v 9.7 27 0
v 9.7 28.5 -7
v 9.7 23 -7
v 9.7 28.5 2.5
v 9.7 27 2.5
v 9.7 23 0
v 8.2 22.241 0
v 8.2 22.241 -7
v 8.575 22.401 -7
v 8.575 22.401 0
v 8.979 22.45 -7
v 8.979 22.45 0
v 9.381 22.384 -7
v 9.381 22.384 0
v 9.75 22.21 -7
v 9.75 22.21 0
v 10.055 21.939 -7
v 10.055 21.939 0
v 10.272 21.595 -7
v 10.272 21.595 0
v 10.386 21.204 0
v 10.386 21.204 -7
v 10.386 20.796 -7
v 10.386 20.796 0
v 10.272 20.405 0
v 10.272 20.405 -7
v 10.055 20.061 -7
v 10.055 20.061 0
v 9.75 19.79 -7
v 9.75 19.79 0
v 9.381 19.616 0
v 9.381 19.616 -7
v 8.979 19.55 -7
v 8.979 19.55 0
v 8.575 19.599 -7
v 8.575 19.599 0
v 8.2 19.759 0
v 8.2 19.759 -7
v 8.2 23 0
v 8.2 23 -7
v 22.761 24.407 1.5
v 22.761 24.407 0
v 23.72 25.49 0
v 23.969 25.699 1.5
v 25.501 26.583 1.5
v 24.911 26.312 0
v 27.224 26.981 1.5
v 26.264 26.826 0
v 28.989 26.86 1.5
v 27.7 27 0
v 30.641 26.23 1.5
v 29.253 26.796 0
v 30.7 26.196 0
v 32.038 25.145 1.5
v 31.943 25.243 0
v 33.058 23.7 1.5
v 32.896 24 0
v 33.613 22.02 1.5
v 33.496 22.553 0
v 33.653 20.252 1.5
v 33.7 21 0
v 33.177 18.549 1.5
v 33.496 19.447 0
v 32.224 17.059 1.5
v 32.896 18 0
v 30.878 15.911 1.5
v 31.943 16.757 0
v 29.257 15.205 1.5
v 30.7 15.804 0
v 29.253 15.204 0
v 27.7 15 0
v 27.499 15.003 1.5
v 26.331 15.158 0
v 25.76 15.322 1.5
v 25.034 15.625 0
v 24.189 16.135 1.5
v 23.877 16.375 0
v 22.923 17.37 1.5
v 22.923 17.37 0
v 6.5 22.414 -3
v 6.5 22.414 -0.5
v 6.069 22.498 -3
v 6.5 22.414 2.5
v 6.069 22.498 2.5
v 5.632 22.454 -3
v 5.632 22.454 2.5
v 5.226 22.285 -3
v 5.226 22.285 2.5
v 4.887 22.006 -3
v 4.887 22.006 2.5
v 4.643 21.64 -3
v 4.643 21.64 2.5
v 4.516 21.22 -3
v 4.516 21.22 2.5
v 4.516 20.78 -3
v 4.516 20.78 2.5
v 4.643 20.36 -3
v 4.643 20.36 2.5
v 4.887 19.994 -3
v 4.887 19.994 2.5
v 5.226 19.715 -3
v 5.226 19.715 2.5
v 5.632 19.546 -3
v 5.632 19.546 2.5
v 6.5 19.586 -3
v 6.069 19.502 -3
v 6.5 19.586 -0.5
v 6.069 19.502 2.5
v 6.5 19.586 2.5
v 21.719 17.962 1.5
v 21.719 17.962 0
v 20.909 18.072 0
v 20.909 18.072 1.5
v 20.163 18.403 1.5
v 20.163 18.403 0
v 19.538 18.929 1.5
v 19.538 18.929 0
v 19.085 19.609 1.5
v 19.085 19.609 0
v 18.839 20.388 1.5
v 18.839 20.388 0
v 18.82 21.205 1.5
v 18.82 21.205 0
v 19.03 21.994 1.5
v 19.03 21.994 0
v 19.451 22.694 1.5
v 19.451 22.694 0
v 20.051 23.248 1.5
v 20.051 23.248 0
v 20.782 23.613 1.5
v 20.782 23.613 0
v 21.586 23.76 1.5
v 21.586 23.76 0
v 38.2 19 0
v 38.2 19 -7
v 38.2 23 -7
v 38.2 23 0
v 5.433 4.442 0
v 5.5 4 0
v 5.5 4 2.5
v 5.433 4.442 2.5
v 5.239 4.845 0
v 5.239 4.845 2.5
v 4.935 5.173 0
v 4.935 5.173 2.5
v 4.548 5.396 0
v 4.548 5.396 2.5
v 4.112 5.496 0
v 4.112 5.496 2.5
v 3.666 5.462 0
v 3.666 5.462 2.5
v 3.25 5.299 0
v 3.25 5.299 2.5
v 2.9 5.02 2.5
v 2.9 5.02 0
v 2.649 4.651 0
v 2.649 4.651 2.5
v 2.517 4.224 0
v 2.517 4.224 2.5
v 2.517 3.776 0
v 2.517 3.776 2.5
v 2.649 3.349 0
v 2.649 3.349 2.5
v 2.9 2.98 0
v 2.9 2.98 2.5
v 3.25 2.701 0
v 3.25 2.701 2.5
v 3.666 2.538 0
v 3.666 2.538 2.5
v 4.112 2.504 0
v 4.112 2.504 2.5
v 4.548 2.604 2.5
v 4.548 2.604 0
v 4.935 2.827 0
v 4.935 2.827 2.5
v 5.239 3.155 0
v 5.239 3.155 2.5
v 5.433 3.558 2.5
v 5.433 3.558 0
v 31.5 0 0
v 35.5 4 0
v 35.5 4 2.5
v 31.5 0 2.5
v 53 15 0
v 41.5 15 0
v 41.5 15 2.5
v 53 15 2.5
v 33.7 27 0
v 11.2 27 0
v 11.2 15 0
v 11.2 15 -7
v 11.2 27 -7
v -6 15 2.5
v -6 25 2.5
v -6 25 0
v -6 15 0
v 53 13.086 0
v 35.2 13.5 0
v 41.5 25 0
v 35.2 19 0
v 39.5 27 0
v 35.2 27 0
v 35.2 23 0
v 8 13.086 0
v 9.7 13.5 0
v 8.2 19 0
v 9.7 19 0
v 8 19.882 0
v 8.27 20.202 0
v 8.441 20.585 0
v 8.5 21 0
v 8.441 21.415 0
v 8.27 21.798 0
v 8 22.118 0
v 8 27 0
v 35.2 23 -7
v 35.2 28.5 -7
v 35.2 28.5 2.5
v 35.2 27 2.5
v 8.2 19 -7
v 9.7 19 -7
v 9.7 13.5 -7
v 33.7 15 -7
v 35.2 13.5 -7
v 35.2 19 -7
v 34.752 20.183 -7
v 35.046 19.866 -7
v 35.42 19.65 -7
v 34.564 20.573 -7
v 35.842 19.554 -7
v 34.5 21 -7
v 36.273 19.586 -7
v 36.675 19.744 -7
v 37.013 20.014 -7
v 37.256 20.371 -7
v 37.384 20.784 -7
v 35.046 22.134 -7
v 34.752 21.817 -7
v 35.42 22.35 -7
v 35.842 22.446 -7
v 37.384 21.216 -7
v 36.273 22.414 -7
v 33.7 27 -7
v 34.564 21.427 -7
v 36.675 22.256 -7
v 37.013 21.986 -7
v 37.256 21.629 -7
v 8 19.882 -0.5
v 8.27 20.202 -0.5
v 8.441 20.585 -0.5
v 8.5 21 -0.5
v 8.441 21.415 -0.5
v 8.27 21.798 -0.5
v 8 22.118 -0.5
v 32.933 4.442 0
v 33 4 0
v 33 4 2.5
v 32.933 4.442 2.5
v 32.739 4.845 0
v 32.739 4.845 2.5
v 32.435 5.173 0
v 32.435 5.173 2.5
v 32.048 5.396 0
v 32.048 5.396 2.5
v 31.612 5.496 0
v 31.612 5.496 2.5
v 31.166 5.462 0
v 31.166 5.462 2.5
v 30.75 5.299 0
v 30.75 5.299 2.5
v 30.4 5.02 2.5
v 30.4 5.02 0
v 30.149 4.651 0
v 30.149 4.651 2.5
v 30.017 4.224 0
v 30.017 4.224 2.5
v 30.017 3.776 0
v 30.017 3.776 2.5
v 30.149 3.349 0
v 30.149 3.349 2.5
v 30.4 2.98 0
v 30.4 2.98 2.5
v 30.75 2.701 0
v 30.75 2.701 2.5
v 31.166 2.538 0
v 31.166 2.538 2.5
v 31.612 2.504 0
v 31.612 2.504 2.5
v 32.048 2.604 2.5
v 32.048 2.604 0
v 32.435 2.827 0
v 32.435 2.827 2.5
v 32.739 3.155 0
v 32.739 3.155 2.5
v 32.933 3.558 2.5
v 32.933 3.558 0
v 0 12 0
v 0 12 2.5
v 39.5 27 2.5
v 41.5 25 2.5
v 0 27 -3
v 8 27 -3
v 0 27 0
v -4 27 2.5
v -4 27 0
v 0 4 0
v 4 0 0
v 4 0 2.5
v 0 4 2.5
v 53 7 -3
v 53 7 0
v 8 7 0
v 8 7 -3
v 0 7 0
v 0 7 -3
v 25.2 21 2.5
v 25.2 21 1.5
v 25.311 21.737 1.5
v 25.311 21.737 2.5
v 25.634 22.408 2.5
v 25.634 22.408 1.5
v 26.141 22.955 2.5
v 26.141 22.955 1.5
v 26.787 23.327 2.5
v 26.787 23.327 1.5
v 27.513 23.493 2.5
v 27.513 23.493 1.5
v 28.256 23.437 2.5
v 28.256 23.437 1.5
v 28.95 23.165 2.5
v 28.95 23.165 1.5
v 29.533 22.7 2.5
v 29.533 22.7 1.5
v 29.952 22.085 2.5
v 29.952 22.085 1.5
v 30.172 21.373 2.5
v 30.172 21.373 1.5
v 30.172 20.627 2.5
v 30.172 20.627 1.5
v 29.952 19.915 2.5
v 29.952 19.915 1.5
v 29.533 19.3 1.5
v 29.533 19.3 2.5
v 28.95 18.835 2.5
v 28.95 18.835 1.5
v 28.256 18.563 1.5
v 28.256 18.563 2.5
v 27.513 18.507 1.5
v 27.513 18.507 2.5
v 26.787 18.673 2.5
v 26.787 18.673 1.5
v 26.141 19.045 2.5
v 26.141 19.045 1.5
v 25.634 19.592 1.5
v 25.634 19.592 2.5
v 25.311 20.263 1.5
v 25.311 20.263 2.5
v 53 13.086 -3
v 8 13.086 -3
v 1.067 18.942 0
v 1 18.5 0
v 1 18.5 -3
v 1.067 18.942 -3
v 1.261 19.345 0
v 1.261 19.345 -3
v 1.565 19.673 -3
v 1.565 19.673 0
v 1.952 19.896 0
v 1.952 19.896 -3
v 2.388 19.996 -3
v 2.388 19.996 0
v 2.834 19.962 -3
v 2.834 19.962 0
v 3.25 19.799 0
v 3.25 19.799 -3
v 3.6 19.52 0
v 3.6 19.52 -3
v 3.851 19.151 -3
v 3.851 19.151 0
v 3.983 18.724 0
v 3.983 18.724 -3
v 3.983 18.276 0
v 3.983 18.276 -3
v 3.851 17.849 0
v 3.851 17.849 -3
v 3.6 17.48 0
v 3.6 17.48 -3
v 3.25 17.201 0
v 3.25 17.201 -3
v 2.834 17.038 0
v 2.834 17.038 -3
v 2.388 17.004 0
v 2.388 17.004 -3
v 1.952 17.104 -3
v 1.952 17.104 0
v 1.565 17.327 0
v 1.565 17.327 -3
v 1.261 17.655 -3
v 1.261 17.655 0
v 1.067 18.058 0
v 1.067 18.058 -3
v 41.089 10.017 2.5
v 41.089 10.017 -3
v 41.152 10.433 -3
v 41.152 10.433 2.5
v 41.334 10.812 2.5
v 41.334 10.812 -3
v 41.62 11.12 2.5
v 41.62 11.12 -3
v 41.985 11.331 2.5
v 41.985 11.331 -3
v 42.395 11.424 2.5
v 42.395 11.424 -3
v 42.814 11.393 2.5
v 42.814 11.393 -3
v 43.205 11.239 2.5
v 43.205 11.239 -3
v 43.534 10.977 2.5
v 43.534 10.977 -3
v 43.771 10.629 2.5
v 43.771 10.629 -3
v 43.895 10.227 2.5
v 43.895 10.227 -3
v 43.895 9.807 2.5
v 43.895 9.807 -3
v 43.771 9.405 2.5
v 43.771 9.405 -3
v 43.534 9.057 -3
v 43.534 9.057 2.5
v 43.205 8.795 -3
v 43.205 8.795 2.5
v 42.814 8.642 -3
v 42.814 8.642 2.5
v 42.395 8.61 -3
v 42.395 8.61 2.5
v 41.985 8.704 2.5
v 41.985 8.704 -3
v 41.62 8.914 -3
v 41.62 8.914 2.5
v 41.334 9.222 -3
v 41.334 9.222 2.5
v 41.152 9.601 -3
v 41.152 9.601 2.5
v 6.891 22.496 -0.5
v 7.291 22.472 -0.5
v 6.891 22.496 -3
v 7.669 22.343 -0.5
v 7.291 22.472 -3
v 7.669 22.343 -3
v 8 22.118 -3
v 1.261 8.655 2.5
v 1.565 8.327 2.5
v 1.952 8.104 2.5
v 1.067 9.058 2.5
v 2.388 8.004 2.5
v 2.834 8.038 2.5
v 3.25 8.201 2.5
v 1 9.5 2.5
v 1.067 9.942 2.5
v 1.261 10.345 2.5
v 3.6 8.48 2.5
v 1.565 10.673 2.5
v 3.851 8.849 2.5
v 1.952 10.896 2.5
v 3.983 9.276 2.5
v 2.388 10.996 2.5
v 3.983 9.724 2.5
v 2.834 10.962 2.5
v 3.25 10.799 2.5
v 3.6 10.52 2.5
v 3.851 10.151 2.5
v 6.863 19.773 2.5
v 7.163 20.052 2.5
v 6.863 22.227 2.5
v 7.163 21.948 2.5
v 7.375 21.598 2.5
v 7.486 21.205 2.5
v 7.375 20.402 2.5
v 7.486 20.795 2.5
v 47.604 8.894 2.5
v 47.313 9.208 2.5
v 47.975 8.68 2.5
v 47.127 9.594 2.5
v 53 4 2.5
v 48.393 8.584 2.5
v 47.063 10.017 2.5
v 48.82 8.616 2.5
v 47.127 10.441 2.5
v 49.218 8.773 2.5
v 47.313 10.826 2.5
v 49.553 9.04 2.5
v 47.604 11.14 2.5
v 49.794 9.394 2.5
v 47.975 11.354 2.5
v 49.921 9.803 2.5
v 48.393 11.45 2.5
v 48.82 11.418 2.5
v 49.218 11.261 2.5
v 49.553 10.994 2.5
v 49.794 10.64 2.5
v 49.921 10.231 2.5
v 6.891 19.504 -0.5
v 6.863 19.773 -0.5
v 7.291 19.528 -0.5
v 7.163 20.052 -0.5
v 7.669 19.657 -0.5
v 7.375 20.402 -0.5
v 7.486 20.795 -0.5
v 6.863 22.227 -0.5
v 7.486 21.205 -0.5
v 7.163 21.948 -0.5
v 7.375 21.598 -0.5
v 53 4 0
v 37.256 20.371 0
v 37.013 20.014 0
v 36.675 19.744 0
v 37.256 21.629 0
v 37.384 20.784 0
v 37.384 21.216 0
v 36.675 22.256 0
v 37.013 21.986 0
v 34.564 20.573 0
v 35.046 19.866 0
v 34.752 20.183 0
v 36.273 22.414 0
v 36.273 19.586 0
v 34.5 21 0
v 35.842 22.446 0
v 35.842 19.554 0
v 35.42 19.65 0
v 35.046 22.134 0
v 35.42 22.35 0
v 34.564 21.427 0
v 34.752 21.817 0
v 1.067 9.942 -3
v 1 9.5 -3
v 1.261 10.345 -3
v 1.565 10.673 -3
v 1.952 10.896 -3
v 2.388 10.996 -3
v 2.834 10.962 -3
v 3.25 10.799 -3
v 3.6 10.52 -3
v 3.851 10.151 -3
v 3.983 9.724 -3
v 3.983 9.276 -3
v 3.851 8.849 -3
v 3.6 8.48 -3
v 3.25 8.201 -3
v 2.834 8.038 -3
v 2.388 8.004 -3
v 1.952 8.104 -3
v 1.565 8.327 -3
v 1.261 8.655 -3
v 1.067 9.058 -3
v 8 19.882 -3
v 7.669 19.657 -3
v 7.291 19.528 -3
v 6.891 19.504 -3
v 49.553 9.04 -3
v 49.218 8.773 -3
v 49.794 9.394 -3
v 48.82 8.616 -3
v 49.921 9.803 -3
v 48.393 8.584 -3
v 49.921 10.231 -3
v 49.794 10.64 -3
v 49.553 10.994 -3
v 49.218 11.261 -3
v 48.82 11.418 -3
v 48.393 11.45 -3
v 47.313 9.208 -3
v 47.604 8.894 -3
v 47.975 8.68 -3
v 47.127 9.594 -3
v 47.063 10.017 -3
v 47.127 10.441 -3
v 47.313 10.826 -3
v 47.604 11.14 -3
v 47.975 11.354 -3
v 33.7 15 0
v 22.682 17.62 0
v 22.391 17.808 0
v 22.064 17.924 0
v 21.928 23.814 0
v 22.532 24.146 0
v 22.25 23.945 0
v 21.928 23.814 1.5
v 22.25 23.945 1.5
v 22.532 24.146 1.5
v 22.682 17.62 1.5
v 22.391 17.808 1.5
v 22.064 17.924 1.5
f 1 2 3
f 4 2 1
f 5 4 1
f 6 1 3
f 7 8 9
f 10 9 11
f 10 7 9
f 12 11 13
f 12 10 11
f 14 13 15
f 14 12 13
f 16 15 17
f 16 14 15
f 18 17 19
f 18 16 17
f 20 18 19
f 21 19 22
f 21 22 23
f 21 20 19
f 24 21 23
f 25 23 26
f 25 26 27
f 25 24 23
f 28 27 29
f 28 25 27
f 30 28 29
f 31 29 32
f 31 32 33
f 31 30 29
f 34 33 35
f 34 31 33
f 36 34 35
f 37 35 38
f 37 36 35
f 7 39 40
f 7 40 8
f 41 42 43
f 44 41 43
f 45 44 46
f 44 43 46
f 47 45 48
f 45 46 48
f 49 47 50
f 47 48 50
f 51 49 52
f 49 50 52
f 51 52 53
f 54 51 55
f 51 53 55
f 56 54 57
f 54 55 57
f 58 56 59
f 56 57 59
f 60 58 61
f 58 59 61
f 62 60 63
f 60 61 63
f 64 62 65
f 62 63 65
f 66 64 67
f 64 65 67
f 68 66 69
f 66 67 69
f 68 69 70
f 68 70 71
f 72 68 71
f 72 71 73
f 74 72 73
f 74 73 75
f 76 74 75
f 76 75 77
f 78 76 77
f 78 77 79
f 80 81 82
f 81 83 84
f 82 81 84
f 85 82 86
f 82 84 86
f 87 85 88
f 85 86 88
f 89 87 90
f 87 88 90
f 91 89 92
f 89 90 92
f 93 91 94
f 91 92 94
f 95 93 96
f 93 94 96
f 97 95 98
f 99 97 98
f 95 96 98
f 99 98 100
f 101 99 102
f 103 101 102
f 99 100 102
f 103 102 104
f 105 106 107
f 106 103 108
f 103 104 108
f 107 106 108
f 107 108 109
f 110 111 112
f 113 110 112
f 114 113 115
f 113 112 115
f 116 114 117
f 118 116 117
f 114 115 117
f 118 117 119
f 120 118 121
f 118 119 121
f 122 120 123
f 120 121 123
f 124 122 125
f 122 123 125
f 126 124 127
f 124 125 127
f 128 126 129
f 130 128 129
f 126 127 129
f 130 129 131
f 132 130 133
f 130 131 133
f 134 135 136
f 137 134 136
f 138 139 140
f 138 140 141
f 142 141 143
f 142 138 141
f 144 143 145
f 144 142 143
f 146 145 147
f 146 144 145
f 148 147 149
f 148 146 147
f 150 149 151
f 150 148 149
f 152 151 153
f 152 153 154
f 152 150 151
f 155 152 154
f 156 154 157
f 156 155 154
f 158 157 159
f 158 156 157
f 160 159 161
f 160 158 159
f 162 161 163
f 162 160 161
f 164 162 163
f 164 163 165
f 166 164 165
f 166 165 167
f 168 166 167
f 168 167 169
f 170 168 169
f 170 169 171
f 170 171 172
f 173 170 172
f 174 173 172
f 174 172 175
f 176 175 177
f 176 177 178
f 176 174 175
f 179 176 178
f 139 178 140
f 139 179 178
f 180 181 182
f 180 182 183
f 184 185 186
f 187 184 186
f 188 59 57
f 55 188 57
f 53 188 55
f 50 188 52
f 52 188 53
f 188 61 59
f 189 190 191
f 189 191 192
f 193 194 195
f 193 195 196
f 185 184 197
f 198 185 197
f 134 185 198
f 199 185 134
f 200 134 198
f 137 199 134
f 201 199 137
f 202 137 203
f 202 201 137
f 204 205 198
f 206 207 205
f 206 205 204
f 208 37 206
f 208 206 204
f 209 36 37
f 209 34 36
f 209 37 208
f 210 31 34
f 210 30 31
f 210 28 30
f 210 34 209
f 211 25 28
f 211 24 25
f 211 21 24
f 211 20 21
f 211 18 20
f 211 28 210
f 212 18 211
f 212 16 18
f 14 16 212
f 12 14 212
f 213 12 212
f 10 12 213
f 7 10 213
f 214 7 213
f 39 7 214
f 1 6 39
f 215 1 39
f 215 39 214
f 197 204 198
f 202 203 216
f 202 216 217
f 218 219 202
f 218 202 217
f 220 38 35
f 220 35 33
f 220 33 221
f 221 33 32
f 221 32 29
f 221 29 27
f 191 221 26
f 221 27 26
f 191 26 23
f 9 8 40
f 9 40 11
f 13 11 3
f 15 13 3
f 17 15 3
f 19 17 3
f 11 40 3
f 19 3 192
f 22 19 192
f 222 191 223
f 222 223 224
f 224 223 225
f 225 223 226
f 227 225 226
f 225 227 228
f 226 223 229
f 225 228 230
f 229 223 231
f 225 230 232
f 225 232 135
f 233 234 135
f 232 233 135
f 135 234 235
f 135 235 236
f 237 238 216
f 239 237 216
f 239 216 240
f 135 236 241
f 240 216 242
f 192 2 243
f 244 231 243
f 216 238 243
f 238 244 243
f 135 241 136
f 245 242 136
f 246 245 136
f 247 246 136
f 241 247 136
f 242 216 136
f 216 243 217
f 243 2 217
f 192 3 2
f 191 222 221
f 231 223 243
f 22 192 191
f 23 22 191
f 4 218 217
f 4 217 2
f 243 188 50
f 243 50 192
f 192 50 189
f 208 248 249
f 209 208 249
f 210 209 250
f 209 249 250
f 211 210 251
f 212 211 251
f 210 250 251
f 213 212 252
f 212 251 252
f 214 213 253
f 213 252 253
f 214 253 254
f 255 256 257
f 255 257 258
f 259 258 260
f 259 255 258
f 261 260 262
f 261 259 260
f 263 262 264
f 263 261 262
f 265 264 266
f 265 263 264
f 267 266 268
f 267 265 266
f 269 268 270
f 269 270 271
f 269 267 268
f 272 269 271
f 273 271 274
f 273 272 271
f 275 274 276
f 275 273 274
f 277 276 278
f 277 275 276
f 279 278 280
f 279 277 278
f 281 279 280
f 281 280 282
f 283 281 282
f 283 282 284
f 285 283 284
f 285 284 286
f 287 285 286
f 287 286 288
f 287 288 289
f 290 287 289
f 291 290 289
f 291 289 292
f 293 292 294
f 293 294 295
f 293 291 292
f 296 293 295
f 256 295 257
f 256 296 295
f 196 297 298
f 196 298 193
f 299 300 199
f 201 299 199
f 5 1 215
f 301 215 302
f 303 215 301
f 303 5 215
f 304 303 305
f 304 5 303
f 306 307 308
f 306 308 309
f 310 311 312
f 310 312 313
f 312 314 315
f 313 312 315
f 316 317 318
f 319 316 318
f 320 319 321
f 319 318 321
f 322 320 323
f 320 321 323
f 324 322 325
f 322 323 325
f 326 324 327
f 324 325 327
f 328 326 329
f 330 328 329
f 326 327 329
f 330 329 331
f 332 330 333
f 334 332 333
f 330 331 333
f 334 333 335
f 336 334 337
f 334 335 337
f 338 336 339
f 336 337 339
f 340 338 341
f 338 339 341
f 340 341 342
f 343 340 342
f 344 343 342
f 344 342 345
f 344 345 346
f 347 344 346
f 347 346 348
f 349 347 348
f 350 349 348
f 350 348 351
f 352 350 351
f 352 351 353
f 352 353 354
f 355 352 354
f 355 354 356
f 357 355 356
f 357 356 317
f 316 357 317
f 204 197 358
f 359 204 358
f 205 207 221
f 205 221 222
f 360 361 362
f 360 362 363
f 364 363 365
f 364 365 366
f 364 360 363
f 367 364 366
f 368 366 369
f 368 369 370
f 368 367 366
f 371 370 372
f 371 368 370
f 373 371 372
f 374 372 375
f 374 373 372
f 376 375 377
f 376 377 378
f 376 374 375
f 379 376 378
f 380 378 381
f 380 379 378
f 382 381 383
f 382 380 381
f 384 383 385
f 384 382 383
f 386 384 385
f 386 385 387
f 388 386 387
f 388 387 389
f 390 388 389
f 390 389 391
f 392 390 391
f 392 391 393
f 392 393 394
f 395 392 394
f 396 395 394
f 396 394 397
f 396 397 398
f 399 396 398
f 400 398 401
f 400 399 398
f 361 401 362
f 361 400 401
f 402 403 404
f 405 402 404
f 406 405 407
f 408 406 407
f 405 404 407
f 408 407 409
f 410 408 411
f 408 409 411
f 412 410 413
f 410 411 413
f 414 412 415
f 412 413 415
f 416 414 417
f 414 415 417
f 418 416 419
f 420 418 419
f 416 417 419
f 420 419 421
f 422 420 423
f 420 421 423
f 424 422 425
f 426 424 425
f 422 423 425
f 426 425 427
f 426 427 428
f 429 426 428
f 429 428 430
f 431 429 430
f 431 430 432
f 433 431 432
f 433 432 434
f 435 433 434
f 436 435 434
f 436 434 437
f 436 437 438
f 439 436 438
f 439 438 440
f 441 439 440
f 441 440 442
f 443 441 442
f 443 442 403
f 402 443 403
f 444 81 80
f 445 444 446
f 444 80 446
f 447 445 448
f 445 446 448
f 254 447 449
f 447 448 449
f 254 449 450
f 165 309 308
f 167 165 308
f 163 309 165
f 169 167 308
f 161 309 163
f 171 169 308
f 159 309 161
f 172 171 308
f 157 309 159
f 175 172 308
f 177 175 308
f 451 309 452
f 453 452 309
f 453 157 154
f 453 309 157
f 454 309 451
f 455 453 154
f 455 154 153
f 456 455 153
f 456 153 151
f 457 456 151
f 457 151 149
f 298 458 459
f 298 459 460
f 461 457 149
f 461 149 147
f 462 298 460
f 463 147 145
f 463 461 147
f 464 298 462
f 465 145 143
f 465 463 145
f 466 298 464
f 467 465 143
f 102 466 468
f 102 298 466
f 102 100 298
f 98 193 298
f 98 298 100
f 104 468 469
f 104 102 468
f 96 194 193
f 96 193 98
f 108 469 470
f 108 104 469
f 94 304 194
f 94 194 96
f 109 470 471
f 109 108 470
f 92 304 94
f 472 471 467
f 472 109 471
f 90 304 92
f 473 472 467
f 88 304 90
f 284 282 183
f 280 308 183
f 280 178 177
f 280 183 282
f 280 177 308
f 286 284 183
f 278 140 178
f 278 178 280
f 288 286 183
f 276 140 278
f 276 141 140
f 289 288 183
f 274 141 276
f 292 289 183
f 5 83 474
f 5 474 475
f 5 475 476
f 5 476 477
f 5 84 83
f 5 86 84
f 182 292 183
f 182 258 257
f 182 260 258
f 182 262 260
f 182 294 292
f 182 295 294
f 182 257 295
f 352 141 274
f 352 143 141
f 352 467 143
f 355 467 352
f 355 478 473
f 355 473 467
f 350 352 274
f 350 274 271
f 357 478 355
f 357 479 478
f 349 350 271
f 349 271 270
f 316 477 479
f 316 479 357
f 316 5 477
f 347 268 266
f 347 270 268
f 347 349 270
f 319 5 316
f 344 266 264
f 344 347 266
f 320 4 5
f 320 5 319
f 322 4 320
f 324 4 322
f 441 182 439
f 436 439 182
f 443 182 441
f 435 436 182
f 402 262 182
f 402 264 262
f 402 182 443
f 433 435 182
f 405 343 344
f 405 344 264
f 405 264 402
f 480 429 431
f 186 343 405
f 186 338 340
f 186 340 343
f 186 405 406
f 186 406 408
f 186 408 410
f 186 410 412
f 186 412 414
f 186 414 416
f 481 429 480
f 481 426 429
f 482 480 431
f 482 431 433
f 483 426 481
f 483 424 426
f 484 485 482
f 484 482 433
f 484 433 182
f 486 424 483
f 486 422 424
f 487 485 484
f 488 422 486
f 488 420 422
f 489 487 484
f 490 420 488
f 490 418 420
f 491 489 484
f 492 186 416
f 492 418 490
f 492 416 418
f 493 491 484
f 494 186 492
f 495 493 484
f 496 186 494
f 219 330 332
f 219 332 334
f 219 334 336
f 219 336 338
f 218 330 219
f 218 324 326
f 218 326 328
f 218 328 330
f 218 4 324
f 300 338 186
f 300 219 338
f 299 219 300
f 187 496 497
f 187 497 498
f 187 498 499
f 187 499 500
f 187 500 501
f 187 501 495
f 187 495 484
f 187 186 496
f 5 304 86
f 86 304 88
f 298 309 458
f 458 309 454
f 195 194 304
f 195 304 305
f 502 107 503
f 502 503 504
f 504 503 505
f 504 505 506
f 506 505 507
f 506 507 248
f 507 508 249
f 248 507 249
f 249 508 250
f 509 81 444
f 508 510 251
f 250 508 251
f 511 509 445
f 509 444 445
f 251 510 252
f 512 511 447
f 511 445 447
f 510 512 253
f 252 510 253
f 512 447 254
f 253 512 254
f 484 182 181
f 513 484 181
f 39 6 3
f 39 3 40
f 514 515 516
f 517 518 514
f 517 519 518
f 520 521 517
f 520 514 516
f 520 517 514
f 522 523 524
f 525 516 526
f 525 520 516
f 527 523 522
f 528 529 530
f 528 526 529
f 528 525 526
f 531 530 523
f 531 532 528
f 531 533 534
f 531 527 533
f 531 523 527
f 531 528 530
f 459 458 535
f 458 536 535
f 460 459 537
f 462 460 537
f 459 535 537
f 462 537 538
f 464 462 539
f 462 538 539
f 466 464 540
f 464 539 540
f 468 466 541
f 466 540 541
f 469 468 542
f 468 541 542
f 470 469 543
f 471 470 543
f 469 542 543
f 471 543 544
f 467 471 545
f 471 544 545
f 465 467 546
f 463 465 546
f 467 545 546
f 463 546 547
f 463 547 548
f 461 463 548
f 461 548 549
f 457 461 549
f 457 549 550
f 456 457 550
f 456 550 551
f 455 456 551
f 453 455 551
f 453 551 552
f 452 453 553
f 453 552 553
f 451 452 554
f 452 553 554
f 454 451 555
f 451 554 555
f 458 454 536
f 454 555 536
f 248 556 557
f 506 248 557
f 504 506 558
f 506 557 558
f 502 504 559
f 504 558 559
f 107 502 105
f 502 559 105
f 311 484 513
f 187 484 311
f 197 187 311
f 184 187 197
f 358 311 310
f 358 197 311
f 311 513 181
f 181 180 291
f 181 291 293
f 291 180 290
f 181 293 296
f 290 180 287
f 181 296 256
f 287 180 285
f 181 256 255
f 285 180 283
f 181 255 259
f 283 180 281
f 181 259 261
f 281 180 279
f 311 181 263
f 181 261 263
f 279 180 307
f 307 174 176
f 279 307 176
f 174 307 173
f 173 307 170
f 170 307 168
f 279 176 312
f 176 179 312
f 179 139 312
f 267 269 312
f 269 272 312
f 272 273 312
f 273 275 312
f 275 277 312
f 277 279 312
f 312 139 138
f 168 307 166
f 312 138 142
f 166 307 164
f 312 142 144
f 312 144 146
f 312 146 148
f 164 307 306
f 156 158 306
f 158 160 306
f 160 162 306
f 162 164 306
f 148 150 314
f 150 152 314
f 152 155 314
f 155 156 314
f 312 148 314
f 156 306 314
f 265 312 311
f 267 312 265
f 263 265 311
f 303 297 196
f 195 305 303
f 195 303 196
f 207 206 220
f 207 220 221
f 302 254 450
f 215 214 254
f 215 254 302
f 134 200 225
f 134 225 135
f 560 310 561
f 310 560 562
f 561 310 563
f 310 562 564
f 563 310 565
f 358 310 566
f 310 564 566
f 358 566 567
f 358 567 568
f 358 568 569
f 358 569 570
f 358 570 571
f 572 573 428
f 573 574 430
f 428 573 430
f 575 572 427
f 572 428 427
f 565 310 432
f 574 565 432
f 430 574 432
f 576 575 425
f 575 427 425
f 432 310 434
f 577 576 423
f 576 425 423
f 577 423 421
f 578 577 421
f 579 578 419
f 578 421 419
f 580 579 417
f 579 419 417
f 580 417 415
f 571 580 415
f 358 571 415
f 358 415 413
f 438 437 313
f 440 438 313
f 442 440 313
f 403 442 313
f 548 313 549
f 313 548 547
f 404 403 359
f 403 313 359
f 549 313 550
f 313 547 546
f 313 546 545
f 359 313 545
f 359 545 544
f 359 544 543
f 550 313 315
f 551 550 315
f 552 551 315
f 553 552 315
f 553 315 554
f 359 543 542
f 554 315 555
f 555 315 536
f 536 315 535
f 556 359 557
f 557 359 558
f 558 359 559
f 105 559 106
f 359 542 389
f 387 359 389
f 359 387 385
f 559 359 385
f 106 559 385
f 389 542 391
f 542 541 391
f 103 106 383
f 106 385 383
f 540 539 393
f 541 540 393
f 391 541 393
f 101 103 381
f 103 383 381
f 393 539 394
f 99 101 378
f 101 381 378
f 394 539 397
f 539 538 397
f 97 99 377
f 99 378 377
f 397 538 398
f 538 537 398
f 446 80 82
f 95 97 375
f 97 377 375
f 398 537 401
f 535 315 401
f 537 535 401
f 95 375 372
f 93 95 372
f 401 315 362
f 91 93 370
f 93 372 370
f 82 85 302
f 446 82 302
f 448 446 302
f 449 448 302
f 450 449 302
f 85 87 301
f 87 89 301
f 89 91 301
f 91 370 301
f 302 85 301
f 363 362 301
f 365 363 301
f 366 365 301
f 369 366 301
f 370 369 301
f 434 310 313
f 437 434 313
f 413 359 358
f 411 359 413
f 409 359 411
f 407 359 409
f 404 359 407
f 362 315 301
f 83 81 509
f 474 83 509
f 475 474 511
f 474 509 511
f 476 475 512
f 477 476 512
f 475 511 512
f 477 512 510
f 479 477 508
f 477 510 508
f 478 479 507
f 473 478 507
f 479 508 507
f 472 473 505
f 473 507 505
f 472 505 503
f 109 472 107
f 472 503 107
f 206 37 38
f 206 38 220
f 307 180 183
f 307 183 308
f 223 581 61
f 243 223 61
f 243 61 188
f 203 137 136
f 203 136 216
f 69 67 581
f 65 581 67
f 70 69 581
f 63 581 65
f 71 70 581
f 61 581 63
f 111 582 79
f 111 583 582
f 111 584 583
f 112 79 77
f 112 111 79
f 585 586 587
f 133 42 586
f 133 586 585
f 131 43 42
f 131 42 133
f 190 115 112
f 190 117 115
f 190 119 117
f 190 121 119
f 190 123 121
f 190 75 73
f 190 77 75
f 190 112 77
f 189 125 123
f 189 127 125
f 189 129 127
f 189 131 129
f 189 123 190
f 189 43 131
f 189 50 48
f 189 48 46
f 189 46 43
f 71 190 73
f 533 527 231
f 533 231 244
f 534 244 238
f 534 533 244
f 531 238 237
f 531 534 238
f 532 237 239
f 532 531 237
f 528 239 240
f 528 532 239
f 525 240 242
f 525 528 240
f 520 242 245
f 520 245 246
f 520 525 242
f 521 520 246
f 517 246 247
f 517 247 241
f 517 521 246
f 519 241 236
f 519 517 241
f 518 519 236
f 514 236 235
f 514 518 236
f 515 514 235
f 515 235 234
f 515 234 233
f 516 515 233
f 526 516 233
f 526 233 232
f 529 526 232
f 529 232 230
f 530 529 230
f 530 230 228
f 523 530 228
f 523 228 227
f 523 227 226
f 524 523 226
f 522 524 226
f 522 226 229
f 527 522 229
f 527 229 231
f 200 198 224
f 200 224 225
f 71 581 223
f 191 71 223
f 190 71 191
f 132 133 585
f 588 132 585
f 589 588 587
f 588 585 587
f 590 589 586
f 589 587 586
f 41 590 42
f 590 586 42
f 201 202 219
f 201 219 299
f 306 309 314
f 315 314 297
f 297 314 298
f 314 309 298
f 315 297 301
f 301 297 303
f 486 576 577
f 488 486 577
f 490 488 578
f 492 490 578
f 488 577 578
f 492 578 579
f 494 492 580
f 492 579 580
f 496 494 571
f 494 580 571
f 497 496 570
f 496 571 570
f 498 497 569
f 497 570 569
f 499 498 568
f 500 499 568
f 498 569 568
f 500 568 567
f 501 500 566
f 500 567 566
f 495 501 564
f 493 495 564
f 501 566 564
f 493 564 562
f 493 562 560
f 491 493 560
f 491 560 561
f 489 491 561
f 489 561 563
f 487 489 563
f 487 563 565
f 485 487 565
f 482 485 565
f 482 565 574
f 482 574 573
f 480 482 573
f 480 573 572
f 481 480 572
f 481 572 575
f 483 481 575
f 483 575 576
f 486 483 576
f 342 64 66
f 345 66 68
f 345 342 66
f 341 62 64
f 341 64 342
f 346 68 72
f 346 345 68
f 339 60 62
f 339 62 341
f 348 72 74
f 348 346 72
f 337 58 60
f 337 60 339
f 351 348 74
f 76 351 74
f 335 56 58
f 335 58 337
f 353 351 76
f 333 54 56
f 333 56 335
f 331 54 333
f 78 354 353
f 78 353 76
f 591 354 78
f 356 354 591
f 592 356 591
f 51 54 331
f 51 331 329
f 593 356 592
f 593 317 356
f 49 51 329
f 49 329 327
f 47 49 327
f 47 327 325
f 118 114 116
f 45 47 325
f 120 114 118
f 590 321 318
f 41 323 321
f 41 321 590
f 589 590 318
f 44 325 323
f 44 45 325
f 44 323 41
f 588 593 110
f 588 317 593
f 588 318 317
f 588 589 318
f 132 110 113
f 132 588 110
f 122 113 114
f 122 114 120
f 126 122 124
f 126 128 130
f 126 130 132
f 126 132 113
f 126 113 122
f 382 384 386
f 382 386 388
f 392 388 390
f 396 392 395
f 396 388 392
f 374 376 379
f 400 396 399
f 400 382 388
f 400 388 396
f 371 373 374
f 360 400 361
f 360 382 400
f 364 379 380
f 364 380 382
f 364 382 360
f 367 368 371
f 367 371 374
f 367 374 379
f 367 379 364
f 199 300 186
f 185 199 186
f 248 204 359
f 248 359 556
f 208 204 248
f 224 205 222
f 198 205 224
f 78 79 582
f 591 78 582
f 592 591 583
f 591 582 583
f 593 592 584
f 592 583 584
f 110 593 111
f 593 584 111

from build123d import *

# Parameters (mm, degrees)
SKETCH_1_R           = 1.5
EXTRUDE_1_DEPTH      = 2.5
EXTRUDE_2_DEPTH      = 7
EXTRUDE_2_DEPTH_BACK = 2.5
SKETCH_2_R           = 1.45
SKETCH_2_W           = 22.5
SKETCH_2_H           = 12
SKETCH_3_W           = 8
SKETCH_3_H           = 20
SKETCH_3_R           = 1.5
EXTRUDE_3_DEPTH      = 3
SKETCH_4_R           = 1.5
CUT_EXTRUDE_1_DEPTH  = 54.969899018
SKETCH_6_R           = 3.49128416
EXTRUDE_4_DEPTH      = 2.5
SKETCH_7_R           = 6
CUT_EXTRUDE_3_DEPTH  = 1.5
CUT_EXTRUDE_4_DEPTH  = 1.5
SKETCH_9_R           = 2.5
CUT_EXTRUDE_5_DEPTH  = 1.5
CUT_EXTRUDE_6_DEPTH  = 55.522930956
CHAMFER_1_SIZE       = 2
SKETCH_11_R          = 1.5
CUT_EXTRUDE_8_DEPTH  = 52.232314022
EXTRUDE_START        = -3
EXTRUDE_7_DEPTH      = 3
SKETCH_18_W          = 3
SKETCH_18_H          = 6.085719459
EXTRUDE_9_DEPTH      = 45
SKETCH_19_R          = 1.410967792
SKETCH_19_R_2        = 1.436695047
CUT_EXTRUDE_9_DEPTH  = 45
EXTRUDE_10_DEPTH     = 17.5
SKETCH_21_R          = 1.436695047
SKETCH_21_R_2        = 1.410967792
CUT_EXTRUDE_10_DEPTH = 17.5


with BuildPart() as part:
    # 草图1 → 凸台-拉伸1 (new body)
    with BuildSketch(Plane.XY):
        Polygon((4, 0), (0, 4), (0, 12), (-10, 17), (-10, 27), (45.5, 27), (45.5, 17), (35.5, 12), (35.5, 4), (31.5, 0), align=None)
        with Locations((4, 4)):
            Circle(SKETCH_1_R, mode=Mode.SUBTRACT)
        with Locations((31.5, 4)):
            Circle(SKETCH_1_R, mode=Mode.SUBTRACT)
        with Locations((7, 21)):
            Circle(SKETCH_1_R, mode=Mode.SUBTRACT)
        with Locations((28.5, 21)):
            Circle(SKETCH_1_R, mode=Mode.SUBTRACT)
    extrude(amount=EXTRUDE_1_DEPTH)

    # 草图2 → 凸台-拉伸2 (add, two sides: drawn at the far end of the back side and taken through both)
    with BuildSketch(Plane(origin=(0, 0, 0), x_dir=(-1, 0, 0), z_dir=(0, 0, -1)).offset(-EXTRUDE_2_DEPTH_BACK)):
        with BuildLine():
            Line((-35.2, 28.5), (-9.7, 28.5))
            Line((-9.7, 28.5), (-9.7, 23))
            Line((-9.7, 23), (-8.2, 23))
            Line((-8.2, 23), (-8.2, 22.240967365))
            ThreePointArc((-8.2, 22.240967365), (-10.4, 21), (-8.2, 19.759032635))
            Line((-8.2, 19.759032635), (-8.2, 19))
            Line((-8.2, 19), (-9.7, 19))
            Line((-9.7, 19), (-9.7, 13.5))
            Line((-9.7, 13.5), (-35.2, 13.5))
            Line((-35.2, 13.5), (-35.2, 19))
            Line((-35.2, 19), (-38.2, 19))
            Line((-38.2, 19), (-38.2, 23))
            Line((-38.2, 23), (-35.2, 23))
            Line((-35.2, 23), (-35.2, 28.5))
        make_face()
        with Locations((-35.95, 21)):
            Circle(SKETCH_2_R, mode=Mode.SUBTRACT)
        with Locations((-22.45, 21)):
            Rectangle(SKETCH_2_W, SKETCH_2_H, mode=Mode.SUBTRACT)
    extrude(amount=EXTRUDE_2_DEPTH + EXTRUDE_2_DEPTH_BACK)

    # 草图3 → 凸台-拉伸3 (add)
    with BuildSketch(Plane(origin=(0, 0, 0), x_dir=(-1, 0, 0), z_dir=(0, 0, -1))):
        with Locations((-4, 17)):
            Rectangle(SKETCH_3_W, SKETCH_3_H)
        with Locations((-2.5, 9.5)):
            Circle(SKETCH_3_R, mode=Mode.SUBTRACT)
        with Locations((-2.5, 18.5)):
            Circle(SKETCH_3_R, mode=Mode.SUBTRACT)
    extrude(amount=EXTRUDE_3_DEPTH)

    # 草图4 → 切除-拉伸1 (cut, through all)
    with BuildSketch(Plane(origin=(0, 0, -3), x_dir=(-1, 0, 0), z_dir=(0, 0, -1))):
        with Locations((-2.5, 9.5)):
            Circle(SKETCH_4_R)
        with Locations(Location((-7, 21, 0), (0, 0, 228.189685104))):
            Circle(SKETCH_4_R)
    extrude(amount=-CUT_EXTRUDE_1_DEPTH, mode=Mode.SUBTRACT)

    # 草图6 → 凸台-拉伸4 (add)
    with BuildSketch(Plane(origin=(0, 0, 0), x_dir=(-1, 0, 0), z_dir=(0, 0, -1))):
        with Locations((-27, 21)):
            Circle(SKETCH_6_R)
    extrude(amount=-EXTRUDE_4_DEPTH)

    # 草图7 → 切除-拉伸3 (cut)
    with BuildSketch(Plane(origin=(0, 0, 0), x_dir=(-1, 0, 0), z_dir=(0, 0, -1))):
        with Locations((-27.7, 21)):
            Circle(SKETCH_7_R)
    extrude(amount=-CUT_EXTRUDE_3_DEPTH, mode=Mode.SUBTRACT)

    # 草图8 → 切除-拉伸4 (cut)
    with BuildSketch(Plane(origin=(0, 0, 0), x_dir=(-1, 0, 0), z_dir=(0, 0, -1))):
        with BuildLine():
            ThreePointArc((-21.71878059, 17.962224138), (-18.800764933, 20.795559838), (-21.585591732, 23.759905678))
            ThreePointArc((-21.585591732, 23.759905678), (-22.24975442, 23.944667862), (-22.761132033, 24.406990344))
            ThreePointArc((-22.761132033, 24.406990344), (-21.701582619, 20.862199682), (-22.92279575, 17.369804474))
            ThreePointArc((-22.92279575, 17.369804474), (-22.39072715, 17.808156096), (-21.71878059, 17.962224138))
        make_face()
    extrude(amount=-CUT_EXTRUDE_4_DEPTH, mode=Mode.SUBTRACT)

    # 草图9 → 切除-拉伸5 (cut)
    with BuildSketch(Plane(origin=(0, 0, 1.5), x_dir=(-1, 0, 0), z_dir=(0, 0, -1))):
        with Locations((-27.7, 21)):
            Circle(SKETCH_9_R)
    extrude(amount=-CUT_EXTRUDE_5_DEPTH, mode=Mode.SUBTRACT)

    # 草图10 → 切除-拉伸6 (cut, through all)
    with BuildSketch(Plane.XY.offset(2.5)):
        Polygon((-6, 27), (-6, 15), (-10, 17), (-10, 27), align=None)
        Polygon((41.5, 27), (41.5, 15), (45.5, 17), (45.5, 27), align=None)
    extrude(amount=-CUT_EXTRUDE_6_DEPTH, mode=Mode.SUBTRACT)

    # 倒角1
    chamfer_1_edges = [part.edges().sort_by_distance(p)[0] for p in [
        (-6, 27, 1.25),
        (41.5, 27, 1.25),
    ]]
    chamfer(chamfer_1_edges, length=CHAMFER_1_SIZE)

    # 草图11 → 切除-拉伸8 (cut, through all)
    with BuildSketch(Plane.XY.offset(2.5)):
        with Locations((6, 21)):
            Circle(SKETCH_11_R)
        with Locations((7, 21)):
            Circle(SKETCH_11_R)
    extrude(amount=-CUT_EXTRUDE_8_DEPTH, mode=Mode.SUBTRACT)

    # 草图12 → 凸台-拉伸7 (add)
    with BuildSketch(Plane.XY.offset(2.5).offset(EXTRUDE_START)):
        with BuildLine():
            ThreePointArc((6.5, 19.585786438), (8.5, 21), (6.5, 22.414213562))
            ThreePointArc((6.5, 22.414213562), (7.5, 21), (6.5, 19.585786438))
        make_face()
    extrude(amount=EXTRUDE_7_DEPTH)

    # 草图18 → 凸台-拉伸9 (add)
    with BuildSketch(Plane(origin=(8, 0, 0), x_dir=(0, 0, -1), z_dir=(1, 0, 0))):
        with Locations((1.5, 10.04285973)):
            Rectangle(SKETCH_18_W, SKETCH_18_H)
    extrude(amount=EXTRUDE_9_DEPTH)

    # 草图19 → 切除-拉伸9 (cut)
    with BuildSketch(Plane(origin=(0, 0, -3), x_dir=(-1, 0, 0), z_dir=(0, 0, -1))):
        with Locations((-42.5, 10.017096625)):
            Circle(SKETCH_19_R)
        with Locations((-48.5, 10.017096625)):
            Circle(SKETCH_19_R_2)
    extrude(amount=-CUT_EXTRUDE_9_DEPTH, mode=Mode.SUBTRACT)

    # 草图20 → 凸台-拉伸10 (add)
    with BuildSketch(Plane(origin=(35.5, 0, 0), x_dir=(0, 0, -1), z_dir=(1, 0, 0))):
        Polygon((-2.5, 15), (-2.5, 12), (-2.5, 4), (0, 4), (0, 7), (0, 12), (0, 15), align=None)
    extrude(amount=EXTRUDE_10_DEPTH)

    # 草图21 → 切除-拉伸10 (cut)
    with BuildSketch(Plane(origin=(0, 0, 0), x_dir=(-1, 0, 0), z_dir=(0, 0, -1))):
        with Locations((-48.5, 10.017096625)):
            Circle(SKETCH_21_R)
        with Locations((-42.5, 10.017096625)):
            Circle(SKETCH_21_R_2)
    extrude(amount=-CUT_EXTRUDE_10_DEPTH, mode=Mode.SUBTRACT)


solid = part.part
